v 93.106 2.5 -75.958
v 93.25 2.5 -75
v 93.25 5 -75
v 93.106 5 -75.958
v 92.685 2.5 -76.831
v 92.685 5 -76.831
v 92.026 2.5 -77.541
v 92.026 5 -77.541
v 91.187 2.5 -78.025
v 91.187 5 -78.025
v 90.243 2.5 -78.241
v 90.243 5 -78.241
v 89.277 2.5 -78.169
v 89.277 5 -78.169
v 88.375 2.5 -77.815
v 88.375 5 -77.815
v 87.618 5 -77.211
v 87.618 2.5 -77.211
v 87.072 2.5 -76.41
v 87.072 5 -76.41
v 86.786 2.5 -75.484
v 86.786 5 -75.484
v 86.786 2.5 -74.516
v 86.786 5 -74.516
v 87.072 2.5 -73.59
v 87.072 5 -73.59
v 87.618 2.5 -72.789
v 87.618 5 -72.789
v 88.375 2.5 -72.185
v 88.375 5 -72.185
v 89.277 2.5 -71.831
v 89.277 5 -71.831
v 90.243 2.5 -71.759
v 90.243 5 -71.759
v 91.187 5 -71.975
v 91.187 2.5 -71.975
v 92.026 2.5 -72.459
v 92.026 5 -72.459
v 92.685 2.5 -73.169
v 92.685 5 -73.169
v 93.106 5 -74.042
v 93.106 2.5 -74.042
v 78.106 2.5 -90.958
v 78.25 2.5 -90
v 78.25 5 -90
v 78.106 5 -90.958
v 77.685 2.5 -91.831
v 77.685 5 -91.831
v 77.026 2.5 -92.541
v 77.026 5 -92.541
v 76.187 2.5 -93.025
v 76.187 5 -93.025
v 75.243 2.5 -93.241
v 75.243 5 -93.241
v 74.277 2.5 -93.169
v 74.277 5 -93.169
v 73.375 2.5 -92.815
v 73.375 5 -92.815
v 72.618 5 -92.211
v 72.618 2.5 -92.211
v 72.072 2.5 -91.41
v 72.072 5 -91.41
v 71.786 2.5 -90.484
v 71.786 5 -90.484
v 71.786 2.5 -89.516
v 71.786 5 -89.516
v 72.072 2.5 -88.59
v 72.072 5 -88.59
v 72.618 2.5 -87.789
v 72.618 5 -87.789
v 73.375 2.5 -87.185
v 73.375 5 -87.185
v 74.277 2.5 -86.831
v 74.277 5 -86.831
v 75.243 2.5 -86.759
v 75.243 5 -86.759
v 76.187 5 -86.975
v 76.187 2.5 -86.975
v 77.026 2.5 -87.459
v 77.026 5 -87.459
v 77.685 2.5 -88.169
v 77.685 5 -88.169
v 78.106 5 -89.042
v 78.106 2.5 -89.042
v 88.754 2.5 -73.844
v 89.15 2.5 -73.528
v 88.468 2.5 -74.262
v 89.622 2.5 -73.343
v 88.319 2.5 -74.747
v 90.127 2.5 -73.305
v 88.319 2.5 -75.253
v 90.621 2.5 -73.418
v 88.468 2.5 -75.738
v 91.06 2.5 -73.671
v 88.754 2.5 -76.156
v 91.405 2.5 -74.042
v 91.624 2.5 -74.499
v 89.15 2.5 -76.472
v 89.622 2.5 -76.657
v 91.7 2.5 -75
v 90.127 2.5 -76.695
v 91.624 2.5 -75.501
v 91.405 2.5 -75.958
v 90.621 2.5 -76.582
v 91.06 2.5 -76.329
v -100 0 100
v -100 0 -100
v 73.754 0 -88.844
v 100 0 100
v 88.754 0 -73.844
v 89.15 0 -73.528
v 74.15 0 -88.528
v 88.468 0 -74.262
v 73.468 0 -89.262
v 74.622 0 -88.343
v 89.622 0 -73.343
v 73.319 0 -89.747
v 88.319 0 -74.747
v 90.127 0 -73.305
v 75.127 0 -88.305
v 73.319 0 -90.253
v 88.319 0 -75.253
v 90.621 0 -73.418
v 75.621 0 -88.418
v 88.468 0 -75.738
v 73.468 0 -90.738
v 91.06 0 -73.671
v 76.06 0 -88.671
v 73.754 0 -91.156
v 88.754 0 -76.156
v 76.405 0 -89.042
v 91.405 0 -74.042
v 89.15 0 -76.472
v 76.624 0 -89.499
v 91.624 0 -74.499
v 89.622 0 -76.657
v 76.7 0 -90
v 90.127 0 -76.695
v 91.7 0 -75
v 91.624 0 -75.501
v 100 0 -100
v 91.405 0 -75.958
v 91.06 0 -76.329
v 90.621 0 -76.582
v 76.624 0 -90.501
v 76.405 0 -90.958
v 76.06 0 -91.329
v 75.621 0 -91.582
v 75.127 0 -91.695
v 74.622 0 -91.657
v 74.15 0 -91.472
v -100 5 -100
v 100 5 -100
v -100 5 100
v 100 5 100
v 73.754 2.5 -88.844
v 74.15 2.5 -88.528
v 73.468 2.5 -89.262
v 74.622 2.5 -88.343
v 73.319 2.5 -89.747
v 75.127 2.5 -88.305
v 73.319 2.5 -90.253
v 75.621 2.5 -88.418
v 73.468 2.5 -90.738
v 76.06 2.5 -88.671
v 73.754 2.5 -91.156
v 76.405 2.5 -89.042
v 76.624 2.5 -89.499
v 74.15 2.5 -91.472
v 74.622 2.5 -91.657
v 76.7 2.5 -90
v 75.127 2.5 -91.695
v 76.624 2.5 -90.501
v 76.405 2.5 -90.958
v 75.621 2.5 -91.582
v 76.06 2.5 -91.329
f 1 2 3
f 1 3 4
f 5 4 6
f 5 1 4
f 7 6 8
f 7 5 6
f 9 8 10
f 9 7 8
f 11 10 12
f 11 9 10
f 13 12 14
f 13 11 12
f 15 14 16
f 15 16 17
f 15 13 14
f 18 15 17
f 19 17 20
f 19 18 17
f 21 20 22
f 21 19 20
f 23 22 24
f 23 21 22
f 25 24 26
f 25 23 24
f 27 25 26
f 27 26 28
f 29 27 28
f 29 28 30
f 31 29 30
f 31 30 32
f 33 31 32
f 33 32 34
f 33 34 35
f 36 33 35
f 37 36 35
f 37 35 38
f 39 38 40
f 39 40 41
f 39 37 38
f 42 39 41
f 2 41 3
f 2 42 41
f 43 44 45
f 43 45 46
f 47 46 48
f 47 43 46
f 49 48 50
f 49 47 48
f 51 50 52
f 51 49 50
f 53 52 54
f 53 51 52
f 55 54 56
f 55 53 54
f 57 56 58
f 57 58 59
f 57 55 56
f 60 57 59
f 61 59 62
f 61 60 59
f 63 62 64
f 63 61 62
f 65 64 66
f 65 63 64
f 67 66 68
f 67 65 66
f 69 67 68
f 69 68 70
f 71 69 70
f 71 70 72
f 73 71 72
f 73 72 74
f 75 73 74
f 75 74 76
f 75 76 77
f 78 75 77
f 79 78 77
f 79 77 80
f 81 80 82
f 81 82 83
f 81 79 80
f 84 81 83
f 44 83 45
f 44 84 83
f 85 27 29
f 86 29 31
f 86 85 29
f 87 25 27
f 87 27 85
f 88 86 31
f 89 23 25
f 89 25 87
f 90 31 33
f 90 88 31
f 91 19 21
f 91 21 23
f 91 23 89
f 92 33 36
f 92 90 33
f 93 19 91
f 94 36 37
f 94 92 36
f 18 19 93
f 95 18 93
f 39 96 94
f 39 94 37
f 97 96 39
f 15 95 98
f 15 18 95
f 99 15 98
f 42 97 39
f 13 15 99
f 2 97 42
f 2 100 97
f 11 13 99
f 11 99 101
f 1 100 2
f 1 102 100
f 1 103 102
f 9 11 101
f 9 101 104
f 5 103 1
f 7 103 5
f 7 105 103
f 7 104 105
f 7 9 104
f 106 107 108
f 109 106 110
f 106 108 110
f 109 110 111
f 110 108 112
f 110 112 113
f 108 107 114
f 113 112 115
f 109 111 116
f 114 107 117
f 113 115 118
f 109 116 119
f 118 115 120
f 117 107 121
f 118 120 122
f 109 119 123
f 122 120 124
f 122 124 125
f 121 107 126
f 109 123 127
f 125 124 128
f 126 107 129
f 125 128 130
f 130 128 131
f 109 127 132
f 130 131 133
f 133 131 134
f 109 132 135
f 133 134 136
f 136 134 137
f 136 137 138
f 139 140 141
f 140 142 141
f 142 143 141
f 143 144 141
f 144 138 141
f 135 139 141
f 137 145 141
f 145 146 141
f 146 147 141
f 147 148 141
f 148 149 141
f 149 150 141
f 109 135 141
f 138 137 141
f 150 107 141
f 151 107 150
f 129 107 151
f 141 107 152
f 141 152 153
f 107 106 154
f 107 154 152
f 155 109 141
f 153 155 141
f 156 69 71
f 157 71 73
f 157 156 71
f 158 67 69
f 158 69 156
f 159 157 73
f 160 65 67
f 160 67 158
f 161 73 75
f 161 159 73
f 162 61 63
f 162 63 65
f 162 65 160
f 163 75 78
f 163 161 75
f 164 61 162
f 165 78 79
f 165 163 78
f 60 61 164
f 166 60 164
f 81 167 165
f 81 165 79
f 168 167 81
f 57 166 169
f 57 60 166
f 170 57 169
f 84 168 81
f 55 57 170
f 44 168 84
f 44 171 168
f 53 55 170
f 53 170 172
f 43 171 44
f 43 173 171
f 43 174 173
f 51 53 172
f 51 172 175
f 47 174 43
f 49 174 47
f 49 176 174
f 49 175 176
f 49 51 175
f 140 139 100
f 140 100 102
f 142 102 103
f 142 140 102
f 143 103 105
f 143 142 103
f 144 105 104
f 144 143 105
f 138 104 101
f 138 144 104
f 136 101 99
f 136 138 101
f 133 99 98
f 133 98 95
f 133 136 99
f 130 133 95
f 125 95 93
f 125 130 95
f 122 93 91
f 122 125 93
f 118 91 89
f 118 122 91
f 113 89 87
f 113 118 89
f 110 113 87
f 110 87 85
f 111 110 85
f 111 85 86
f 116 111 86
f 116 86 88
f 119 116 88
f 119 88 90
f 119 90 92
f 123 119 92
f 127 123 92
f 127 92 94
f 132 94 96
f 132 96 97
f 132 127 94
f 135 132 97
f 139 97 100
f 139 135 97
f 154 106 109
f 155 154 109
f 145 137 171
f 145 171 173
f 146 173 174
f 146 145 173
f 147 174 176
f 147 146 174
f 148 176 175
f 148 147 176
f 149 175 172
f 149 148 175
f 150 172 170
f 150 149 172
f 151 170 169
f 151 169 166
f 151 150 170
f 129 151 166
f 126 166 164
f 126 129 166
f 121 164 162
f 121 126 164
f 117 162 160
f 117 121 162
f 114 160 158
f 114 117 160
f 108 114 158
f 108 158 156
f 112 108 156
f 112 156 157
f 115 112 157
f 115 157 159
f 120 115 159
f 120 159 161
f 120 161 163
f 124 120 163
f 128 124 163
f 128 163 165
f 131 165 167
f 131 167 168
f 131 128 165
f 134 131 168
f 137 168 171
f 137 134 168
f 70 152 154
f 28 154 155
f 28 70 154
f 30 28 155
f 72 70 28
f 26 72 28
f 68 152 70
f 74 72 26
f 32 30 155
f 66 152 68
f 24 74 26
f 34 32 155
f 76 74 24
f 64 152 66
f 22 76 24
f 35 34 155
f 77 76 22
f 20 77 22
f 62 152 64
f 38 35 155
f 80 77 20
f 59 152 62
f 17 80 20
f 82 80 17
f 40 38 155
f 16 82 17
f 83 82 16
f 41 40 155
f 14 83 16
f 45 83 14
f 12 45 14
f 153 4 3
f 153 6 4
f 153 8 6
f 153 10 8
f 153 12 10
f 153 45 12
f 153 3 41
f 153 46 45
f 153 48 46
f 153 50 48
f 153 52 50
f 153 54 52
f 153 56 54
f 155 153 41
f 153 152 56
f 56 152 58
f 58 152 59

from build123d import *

# Parameters (mm, degrees)
SKETCH1_W                                     = 200
SKETCH1_H                                     = 200
BASE_PLATE_DEPTH                              = 5
CBORE_START                                   = 2.5
CBORE_FOR_M3_HEX_SOCKET_HEAD_CAP_SCR_2_R      = 3.25
CBORE_FOR_M3_HEX_SOCKET_HEAD_CAP_SCREW1_DEPTH = 2.5
CBORE_FOR_M3_HEX_SOCKET_HEAD_CAP_SCR_3_O_R    = 1.7
CBORE_FOR_M3_HEX_SOCKET_HEAD_CAP_SCR_3_DEPTH  = 2.5


# Read off the part's stored shape, not the designer's step: CBORE for M3 Hex Socket Head Cap Screw1
with BuildPart() as part:
    # Sketch1 → base_plate (new body)
    with BuildSketch(Plane(origin=(0, 0, 0), x_dir=(1, 0, 0), z_dir=(0, 1, 0))):
        Rectangle(SKETCH1_W, SKETCH1_H)
    extrude(amount=BASE_PLATE_DEPTH)

    # CBORE for M3 Hex Socket Head Cap Scr 2 → CBORE for M3 Hex Socket Head Cap Screw1 (cut)
    with BuildSketch(Plane(origin=(0, 0, 0), x_dir=(1, 0, 0), z_dir=(0, 1, 0)).offset(CBORE_START)):
        with Locations((90, 75)):
            Circle(CBORE_FOR_M3_HEX_SOCKET_HEAD_CAP_SCR_2_R)
        with Locations((75, 90)):
            Circle(CBORE_FOR_M3_HEX_SOCKET_HEAD_CAP_SCR_2_R)
    extrude(amount=CBORE_FOR_M3_HEX_SOCKET_HEAD_CAP_SCREW1_DEPTH, mode=Mode.SUBTRACT)

    # CBORE for M3 Hex Socket Head Cap Scr 3 o → CBORE for M3 Hex Socket Head Cap Scr 3 (cut)
    with BuildSketch(Plane(origin=(0, 0, 0), x_dir=(1, 0, 0), z_dir=(0, 1, 0))):
        with Locations((90, 75)):
            Circle(CBORE_FOR_M3_HEX_SOCKET_HEAD_CAP_SCR_3_O_R)
        with Locations((75, 90)):
            Circle(CBORE_FOR_M3_HEX_SOCKET_HEAD_CAP_SCR_3_O_R)
    extrude(amount=CBORE_FOR_M3_HEX_SOCKET_HEAD_CAP_SCR_3_DEPTH, mode=Mode.SUBTRACT)


solid = part.part
